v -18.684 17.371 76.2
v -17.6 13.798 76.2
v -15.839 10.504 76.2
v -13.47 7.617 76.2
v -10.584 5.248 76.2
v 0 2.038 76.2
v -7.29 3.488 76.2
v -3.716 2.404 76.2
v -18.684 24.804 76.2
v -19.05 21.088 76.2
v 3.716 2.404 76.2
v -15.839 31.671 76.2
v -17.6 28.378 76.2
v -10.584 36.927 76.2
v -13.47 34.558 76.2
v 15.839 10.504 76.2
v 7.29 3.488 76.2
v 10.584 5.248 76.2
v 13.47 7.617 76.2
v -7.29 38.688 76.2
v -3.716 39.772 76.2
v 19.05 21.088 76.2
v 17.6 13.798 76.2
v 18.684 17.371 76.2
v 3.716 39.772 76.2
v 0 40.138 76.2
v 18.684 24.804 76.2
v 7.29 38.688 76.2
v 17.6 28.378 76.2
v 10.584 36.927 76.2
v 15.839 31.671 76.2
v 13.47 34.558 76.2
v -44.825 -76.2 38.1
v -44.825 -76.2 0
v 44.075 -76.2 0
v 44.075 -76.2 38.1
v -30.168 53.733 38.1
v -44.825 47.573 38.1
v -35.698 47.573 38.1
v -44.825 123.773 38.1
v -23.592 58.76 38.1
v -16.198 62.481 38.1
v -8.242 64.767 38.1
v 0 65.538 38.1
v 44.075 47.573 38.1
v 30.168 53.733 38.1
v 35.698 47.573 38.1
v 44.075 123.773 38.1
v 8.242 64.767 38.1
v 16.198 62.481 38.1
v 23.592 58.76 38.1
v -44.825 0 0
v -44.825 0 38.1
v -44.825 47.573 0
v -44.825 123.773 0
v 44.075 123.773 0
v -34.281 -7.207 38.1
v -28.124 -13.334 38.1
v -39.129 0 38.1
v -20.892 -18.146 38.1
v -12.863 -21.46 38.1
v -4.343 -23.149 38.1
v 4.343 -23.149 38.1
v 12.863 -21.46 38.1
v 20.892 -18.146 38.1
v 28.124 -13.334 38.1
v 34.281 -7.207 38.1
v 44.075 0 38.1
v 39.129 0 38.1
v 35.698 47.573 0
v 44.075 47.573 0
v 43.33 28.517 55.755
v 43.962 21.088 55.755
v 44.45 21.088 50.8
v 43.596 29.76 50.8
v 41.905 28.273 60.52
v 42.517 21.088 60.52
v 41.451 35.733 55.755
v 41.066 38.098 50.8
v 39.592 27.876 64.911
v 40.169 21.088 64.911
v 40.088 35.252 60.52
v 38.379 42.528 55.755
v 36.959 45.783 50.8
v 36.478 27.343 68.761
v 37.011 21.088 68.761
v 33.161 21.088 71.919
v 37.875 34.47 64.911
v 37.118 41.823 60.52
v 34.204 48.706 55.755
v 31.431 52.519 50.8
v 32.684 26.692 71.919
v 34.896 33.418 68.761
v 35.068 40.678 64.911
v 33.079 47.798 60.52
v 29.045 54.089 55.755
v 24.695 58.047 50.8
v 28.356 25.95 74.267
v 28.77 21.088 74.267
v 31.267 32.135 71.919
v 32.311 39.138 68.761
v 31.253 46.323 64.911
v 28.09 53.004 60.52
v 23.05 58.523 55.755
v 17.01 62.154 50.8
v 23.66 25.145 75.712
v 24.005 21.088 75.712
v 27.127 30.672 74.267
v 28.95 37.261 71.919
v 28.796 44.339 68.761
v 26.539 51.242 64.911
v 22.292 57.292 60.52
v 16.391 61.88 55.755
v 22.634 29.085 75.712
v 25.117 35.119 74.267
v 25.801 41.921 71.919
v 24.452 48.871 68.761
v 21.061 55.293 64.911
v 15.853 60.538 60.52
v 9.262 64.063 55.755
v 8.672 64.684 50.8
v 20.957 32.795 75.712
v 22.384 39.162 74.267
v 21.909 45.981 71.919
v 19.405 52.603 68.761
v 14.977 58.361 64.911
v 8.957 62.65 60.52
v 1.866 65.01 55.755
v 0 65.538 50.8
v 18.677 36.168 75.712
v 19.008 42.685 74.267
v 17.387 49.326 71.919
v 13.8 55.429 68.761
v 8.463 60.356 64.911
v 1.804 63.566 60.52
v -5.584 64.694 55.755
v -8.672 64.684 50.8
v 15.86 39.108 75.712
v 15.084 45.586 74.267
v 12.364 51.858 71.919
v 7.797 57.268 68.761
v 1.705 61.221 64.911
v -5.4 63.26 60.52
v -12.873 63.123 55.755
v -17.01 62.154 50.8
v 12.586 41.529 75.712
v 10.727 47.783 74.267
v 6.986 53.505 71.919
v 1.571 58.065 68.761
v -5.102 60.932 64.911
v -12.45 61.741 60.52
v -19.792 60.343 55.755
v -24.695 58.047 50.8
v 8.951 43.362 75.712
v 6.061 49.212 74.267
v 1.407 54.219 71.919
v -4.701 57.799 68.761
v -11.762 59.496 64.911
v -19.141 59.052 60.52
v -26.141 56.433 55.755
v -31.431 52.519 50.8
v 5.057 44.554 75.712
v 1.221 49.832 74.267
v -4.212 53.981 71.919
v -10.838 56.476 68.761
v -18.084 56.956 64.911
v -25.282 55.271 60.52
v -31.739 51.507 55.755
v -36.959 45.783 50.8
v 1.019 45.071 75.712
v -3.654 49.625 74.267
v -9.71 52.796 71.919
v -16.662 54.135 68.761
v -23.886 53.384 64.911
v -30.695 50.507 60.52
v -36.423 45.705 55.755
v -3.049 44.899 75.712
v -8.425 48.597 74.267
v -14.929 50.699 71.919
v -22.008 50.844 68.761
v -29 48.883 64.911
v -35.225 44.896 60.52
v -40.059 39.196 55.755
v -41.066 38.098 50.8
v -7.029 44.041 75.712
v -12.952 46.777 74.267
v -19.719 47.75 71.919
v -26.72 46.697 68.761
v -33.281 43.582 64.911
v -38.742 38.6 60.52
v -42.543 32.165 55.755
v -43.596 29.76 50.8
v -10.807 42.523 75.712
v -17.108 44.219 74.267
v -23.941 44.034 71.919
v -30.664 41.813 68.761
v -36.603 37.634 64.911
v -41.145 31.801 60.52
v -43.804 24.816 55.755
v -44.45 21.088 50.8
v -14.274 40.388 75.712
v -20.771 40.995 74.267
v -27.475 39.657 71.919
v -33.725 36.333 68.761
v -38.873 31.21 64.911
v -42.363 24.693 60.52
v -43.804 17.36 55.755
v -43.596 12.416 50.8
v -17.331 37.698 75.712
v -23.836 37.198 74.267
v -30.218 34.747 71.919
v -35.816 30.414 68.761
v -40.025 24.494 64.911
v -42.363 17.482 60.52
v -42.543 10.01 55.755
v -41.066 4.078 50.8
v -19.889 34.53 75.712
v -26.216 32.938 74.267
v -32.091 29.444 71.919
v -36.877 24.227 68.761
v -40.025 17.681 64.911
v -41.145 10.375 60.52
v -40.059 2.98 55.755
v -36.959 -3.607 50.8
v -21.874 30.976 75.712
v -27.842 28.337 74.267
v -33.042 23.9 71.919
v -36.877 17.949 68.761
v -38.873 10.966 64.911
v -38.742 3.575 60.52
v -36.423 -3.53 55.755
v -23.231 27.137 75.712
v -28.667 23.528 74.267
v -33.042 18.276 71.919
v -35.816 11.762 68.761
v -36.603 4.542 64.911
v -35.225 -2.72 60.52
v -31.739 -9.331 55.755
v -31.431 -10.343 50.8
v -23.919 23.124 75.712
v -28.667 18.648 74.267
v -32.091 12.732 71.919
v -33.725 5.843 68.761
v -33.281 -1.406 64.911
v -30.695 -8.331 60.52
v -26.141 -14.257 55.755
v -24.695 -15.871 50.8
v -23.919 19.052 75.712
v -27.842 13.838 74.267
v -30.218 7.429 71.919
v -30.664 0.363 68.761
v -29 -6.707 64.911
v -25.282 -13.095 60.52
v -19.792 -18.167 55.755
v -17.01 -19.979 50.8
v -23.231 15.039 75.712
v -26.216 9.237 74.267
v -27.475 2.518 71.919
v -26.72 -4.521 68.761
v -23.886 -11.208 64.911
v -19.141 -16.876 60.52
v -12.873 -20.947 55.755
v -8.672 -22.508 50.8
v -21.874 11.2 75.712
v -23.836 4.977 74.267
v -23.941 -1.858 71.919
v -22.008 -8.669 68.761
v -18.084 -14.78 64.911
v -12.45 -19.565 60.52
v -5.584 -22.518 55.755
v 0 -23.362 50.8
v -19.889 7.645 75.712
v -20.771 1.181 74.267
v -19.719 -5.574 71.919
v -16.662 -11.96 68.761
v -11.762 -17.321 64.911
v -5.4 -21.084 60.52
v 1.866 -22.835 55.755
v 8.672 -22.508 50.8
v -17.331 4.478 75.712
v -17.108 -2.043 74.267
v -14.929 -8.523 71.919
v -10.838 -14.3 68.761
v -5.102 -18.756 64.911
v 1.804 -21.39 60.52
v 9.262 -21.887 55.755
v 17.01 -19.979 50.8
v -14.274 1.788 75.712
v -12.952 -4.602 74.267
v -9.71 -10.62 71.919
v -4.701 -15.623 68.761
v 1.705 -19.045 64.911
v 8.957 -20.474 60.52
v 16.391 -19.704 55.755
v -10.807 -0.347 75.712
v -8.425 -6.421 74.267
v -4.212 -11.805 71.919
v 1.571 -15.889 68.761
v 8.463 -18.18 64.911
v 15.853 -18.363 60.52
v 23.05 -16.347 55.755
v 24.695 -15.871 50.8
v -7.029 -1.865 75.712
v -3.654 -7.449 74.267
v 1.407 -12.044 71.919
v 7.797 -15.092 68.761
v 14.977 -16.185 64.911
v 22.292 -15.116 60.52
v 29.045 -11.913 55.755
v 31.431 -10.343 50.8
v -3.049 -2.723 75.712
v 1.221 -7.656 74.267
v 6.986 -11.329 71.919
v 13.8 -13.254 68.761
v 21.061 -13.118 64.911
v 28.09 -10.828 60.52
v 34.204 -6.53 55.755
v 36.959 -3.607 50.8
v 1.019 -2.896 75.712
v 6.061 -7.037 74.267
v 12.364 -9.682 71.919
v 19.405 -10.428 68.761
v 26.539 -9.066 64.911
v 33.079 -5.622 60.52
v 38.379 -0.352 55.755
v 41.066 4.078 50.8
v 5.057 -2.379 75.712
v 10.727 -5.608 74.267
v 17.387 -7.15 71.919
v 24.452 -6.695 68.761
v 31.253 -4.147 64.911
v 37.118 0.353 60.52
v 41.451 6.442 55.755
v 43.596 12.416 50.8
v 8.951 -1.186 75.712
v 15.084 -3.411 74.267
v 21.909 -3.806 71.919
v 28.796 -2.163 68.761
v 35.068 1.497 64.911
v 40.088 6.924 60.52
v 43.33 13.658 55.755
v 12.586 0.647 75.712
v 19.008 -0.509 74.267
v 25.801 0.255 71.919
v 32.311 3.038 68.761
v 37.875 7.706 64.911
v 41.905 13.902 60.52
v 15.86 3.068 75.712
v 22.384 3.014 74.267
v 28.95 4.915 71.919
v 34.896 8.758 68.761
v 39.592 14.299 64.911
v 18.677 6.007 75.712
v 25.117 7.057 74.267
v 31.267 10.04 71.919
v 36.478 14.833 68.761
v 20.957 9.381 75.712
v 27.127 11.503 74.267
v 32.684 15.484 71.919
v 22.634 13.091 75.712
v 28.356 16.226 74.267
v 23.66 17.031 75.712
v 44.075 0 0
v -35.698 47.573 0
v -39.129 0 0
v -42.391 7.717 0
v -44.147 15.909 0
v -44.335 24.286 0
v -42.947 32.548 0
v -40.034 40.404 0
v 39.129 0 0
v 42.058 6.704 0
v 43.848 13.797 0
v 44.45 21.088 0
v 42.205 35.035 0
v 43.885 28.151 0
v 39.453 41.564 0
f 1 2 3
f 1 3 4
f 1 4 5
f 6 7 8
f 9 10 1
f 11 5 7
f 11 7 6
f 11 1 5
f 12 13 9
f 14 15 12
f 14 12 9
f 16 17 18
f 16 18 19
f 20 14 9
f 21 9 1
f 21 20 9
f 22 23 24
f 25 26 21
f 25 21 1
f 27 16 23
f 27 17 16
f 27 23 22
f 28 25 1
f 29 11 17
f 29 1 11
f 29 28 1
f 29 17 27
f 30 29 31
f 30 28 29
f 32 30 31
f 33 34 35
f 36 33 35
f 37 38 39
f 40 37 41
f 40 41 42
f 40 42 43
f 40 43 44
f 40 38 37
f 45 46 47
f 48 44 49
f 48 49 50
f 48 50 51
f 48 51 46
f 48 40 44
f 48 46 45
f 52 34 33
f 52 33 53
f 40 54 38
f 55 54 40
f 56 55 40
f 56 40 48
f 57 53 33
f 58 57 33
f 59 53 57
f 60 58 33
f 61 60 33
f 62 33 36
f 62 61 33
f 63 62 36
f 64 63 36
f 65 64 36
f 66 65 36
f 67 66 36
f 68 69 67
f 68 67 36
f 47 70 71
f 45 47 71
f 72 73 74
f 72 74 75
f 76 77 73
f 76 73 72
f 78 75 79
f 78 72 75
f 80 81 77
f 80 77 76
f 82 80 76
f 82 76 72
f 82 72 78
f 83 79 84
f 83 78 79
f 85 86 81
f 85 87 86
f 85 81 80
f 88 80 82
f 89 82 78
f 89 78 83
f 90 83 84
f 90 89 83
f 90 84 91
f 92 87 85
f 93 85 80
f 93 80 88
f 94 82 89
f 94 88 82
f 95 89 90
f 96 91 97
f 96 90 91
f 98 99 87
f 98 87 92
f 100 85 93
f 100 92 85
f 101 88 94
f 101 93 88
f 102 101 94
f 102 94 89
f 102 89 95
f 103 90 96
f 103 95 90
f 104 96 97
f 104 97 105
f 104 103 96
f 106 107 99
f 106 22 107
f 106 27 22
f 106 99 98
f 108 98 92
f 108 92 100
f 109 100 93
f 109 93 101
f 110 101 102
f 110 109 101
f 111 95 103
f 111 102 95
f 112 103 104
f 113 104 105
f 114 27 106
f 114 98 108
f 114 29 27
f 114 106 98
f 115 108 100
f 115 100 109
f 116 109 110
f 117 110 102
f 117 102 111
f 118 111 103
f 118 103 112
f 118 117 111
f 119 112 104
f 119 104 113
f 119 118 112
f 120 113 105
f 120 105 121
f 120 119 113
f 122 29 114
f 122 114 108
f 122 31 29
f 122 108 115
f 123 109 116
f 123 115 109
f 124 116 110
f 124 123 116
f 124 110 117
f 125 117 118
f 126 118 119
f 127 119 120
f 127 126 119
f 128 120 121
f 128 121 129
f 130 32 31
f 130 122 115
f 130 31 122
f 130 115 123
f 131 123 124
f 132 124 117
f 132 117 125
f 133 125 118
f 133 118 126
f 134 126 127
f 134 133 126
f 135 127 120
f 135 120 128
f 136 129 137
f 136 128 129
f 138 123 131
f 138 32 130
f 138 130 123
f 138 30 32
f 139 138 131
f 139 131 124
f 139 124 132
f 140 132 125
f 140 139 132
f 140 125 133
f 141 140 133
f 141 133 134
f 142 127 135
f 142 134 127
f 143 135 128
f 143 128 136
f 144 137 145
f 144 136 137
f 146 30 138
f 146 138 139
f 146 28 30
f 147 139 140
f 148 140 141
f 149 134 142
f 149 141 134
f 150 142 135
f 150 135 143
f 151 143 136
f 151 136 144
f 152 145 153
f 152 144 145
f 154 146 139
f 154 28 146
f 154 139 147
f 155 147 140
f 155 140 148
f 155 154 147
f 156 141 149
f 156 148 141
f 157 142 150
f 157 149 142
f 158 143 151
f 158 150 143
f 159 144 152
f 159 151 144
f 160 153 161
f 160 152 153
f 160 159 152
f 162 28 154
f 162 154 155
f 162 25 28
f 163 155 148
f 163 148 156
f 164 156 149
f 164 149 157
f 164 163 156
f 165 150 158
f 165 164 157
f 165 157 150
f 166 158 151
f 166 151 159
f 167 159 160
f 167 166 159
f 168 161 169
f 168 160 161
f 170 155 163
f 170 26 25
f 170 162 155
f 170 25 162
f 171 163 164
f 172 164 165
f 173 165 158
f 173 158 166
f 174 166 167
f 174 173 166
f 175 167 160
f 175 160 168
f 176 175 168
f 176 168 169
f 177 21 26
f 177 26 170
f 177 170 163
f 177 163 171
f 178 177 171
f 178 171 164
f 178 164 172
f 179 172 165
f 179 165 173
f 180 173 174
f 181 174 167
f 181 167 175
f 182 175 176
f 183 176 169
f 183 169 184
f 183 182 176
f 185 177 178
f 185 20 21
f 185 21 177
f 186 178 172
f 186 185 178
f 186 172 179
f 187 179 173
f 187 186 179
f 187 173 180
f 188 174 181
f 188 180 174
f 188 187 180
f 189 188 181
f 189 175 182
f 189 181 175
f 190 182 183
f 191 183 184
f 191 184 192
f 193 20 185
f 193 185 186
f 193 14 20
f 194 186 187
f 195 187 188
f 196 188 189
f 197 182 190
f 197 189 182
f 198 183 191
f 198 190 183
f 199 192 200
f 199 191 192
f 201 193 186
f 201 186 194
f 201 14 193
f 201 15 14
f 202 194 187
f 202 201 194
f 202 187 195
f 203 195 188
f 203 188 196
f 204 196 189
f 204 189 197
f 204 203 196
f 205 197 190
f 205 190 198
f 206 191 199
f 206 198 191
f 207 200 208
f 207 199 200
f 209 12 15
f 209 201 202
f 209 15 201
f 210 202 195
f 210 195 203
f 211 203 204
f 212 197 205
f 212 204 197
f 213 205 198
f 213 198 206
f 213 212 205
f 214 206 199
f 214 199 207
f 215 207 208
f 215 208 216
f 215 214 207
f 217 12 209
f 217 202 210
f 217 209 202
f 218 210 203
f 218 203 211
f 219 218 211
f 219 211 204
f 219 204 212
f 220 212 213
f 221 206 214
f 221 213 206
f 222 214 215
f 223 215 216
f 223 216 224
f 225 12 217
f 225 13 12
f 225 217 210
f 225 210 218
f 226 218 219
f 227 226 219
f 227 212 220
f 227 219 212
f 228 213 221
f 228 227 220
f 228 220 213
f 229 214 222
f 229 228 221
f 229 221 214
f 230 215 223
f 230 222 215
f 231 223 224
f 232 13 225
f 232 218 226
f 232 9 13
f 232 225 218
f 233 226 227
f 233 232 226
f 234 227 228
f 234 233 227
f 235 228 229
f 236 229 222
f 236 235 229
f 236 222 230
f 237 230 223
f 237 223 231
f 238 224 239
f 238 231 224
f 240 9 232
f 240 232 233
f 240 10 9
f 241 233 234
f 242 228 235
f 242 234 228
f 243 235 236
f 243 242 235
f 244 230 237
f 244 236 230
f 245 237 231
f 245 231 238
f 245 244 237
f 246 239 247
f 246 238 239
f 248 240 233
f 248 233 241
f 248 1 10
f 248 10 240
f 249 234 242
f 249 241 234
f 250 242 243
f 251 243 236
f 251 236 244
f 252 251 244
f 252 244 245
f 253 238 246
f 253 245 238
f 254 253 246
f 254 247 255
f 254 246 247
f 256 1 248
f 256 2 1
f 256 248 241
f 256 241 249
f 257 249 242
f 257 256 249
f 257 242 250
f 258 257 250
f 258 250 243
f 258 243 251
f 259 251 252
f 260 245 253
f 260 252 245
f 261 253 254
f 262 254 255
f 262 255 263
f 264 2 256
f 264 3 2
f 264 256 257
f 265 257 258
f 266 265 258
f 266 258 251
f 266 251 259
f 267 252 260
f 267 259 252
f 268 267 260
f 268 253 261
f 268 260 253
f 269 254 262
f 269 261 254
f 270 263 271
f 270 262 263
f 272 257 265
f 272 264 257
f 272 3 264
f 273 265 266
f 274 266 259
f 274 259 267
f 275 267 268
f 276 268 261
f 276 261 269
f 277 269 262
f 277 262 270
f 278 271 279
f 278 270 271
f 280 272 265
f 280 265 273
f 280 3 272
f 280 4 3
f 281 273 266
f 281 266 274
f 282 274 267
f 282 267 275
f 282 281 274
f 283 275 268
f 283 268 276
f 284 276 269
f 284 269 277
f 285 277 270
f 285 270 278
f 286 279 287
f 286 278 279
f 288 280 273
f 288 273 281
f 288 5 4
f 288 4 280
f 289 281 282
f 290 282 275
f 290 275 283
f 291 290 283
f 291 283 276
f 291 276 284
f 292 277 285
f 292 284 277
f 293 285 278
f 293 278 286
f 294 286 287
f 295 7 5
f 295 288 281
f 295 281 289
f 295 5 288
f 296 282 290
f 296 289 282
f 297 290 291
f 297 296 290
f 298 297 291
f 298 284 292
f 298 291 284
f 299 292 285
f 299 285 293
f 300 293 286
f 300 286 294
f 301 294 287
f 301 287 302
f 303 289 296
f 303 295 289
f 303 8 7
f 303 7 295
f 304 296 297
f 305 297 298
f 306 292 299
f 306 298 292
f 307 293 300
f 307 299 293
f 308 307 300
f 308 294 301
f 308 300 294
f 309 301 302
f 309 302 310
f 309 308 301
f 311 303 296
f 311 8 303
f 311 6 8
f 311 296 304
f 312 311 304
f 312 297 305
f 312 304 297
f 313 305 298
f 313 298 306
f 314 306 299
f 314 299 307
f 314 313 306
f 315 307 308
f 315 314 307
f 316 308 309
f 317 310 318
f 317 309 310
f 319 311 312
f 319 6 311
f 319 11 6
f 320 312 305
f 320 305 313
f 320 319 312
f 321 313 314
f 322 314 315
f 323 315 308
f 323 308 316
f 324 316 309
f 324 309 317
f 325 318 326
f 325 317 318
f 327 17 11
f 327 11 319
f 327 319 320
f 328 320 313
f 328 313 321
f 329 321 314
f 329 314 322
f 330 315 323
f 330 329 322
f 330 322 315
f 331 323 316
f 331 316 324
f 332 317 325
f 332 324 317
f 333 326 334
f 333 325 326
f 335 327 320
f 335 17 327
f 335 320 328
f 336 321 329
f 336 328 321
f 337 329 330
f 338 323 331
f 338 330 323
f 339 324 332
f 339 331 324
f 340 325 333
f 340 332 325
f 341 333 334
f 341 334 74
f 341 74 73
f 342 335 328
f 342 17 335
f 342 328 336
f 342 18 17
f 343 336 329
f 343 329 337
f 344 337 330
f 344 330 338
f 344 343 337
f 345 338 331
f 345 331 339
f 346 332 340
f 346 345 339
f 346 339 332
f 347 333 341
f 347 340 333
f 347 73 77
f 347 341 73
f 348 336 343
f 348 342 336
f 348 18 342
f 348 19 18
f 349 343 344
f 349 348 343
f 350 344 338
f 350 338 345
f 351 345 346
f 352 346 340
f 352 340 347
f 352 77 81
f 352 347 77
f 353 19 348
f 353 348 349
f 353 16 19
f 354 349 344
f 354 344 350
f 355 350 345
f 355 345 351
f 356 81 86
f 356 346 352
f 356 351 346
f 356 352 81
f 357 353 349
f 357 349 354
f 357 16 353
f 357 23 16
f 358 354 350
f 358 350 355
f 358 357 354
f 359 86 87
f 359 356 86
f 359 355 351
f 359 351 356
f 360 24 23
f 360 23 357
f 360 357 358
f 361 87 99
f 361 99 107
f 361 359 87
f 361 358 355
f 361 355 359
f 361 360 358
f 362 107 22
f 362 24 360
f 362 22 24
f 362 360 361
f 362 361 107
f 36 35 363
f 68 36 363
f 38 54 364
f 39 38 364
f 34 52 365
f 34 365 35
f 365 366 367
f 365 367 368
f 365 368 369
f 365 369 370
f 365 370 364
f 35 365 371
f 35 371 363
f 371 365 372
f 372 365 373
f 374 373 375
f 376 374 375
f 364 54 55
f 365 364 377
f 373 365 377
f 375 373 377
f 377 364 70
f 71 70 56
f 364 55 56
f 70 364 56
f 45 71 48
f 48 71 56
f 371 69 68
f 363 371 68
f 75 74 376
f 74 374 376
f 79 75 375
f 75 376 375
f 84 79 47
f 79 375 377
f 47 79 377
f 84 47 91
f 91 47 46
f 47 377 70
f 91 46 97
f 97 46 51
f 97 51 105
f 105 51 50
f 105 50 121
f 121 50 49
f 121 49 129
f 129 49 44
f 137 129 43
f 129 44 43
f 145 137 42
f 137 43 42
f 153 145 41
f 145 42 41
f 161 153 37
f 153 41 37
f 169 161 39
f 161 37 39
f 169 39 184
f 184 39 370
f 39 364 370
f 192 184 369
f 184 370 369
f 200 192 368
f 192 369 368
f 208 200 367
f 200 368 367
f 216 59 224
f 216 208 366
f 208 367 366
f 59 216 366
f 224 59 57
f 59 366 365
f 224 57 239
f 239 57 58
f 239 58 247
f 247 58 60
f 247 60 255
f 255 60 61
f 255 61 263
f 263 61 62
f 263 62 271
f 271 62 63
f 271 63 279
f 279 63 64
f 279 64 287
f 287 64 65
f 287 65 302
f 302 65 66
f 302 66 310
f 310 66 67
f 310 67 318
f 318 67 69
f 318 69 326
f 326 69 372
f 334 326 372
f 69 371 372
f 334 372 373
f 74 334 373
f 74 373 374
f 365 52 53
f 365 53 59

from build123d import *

# Parameters (mm, degrees)
F0_R     = 44.45
F1_DEPTH = 76.2
F2_R     = 25.4
F3_W     = 88.9
F3_H     = 76.2
F4_DEPTH = 38.1


with BuildPart() as f1:
    # F0 (on Top) → F1 (new body)
    with BuildSketch(Plane.XY):
        with Locations((0, 21.087829)):
            Circle(F0_R)
    extrude(amount=F1_DEPTH)

    # F2
    f2_edges = [f1.edges().sort_by_distance(p)[0] for p in [
        (-44.45, 21.087829, 76.2),
    ]]
    fillet(f2_edges, radius=F2_R)

    # F3 (on Top) → F4 (join)
    with BuildSketch(Plane.XY):
        with Locations((-0.375016, -38.1)):
            Rectangle(F3_W, F3_H)
        with Locations((-0.375016, 85.672979)):
            Rectangle(F3_W, F3_H)
    extrude(amount=F4_DEPTH)


solid = f1.part
